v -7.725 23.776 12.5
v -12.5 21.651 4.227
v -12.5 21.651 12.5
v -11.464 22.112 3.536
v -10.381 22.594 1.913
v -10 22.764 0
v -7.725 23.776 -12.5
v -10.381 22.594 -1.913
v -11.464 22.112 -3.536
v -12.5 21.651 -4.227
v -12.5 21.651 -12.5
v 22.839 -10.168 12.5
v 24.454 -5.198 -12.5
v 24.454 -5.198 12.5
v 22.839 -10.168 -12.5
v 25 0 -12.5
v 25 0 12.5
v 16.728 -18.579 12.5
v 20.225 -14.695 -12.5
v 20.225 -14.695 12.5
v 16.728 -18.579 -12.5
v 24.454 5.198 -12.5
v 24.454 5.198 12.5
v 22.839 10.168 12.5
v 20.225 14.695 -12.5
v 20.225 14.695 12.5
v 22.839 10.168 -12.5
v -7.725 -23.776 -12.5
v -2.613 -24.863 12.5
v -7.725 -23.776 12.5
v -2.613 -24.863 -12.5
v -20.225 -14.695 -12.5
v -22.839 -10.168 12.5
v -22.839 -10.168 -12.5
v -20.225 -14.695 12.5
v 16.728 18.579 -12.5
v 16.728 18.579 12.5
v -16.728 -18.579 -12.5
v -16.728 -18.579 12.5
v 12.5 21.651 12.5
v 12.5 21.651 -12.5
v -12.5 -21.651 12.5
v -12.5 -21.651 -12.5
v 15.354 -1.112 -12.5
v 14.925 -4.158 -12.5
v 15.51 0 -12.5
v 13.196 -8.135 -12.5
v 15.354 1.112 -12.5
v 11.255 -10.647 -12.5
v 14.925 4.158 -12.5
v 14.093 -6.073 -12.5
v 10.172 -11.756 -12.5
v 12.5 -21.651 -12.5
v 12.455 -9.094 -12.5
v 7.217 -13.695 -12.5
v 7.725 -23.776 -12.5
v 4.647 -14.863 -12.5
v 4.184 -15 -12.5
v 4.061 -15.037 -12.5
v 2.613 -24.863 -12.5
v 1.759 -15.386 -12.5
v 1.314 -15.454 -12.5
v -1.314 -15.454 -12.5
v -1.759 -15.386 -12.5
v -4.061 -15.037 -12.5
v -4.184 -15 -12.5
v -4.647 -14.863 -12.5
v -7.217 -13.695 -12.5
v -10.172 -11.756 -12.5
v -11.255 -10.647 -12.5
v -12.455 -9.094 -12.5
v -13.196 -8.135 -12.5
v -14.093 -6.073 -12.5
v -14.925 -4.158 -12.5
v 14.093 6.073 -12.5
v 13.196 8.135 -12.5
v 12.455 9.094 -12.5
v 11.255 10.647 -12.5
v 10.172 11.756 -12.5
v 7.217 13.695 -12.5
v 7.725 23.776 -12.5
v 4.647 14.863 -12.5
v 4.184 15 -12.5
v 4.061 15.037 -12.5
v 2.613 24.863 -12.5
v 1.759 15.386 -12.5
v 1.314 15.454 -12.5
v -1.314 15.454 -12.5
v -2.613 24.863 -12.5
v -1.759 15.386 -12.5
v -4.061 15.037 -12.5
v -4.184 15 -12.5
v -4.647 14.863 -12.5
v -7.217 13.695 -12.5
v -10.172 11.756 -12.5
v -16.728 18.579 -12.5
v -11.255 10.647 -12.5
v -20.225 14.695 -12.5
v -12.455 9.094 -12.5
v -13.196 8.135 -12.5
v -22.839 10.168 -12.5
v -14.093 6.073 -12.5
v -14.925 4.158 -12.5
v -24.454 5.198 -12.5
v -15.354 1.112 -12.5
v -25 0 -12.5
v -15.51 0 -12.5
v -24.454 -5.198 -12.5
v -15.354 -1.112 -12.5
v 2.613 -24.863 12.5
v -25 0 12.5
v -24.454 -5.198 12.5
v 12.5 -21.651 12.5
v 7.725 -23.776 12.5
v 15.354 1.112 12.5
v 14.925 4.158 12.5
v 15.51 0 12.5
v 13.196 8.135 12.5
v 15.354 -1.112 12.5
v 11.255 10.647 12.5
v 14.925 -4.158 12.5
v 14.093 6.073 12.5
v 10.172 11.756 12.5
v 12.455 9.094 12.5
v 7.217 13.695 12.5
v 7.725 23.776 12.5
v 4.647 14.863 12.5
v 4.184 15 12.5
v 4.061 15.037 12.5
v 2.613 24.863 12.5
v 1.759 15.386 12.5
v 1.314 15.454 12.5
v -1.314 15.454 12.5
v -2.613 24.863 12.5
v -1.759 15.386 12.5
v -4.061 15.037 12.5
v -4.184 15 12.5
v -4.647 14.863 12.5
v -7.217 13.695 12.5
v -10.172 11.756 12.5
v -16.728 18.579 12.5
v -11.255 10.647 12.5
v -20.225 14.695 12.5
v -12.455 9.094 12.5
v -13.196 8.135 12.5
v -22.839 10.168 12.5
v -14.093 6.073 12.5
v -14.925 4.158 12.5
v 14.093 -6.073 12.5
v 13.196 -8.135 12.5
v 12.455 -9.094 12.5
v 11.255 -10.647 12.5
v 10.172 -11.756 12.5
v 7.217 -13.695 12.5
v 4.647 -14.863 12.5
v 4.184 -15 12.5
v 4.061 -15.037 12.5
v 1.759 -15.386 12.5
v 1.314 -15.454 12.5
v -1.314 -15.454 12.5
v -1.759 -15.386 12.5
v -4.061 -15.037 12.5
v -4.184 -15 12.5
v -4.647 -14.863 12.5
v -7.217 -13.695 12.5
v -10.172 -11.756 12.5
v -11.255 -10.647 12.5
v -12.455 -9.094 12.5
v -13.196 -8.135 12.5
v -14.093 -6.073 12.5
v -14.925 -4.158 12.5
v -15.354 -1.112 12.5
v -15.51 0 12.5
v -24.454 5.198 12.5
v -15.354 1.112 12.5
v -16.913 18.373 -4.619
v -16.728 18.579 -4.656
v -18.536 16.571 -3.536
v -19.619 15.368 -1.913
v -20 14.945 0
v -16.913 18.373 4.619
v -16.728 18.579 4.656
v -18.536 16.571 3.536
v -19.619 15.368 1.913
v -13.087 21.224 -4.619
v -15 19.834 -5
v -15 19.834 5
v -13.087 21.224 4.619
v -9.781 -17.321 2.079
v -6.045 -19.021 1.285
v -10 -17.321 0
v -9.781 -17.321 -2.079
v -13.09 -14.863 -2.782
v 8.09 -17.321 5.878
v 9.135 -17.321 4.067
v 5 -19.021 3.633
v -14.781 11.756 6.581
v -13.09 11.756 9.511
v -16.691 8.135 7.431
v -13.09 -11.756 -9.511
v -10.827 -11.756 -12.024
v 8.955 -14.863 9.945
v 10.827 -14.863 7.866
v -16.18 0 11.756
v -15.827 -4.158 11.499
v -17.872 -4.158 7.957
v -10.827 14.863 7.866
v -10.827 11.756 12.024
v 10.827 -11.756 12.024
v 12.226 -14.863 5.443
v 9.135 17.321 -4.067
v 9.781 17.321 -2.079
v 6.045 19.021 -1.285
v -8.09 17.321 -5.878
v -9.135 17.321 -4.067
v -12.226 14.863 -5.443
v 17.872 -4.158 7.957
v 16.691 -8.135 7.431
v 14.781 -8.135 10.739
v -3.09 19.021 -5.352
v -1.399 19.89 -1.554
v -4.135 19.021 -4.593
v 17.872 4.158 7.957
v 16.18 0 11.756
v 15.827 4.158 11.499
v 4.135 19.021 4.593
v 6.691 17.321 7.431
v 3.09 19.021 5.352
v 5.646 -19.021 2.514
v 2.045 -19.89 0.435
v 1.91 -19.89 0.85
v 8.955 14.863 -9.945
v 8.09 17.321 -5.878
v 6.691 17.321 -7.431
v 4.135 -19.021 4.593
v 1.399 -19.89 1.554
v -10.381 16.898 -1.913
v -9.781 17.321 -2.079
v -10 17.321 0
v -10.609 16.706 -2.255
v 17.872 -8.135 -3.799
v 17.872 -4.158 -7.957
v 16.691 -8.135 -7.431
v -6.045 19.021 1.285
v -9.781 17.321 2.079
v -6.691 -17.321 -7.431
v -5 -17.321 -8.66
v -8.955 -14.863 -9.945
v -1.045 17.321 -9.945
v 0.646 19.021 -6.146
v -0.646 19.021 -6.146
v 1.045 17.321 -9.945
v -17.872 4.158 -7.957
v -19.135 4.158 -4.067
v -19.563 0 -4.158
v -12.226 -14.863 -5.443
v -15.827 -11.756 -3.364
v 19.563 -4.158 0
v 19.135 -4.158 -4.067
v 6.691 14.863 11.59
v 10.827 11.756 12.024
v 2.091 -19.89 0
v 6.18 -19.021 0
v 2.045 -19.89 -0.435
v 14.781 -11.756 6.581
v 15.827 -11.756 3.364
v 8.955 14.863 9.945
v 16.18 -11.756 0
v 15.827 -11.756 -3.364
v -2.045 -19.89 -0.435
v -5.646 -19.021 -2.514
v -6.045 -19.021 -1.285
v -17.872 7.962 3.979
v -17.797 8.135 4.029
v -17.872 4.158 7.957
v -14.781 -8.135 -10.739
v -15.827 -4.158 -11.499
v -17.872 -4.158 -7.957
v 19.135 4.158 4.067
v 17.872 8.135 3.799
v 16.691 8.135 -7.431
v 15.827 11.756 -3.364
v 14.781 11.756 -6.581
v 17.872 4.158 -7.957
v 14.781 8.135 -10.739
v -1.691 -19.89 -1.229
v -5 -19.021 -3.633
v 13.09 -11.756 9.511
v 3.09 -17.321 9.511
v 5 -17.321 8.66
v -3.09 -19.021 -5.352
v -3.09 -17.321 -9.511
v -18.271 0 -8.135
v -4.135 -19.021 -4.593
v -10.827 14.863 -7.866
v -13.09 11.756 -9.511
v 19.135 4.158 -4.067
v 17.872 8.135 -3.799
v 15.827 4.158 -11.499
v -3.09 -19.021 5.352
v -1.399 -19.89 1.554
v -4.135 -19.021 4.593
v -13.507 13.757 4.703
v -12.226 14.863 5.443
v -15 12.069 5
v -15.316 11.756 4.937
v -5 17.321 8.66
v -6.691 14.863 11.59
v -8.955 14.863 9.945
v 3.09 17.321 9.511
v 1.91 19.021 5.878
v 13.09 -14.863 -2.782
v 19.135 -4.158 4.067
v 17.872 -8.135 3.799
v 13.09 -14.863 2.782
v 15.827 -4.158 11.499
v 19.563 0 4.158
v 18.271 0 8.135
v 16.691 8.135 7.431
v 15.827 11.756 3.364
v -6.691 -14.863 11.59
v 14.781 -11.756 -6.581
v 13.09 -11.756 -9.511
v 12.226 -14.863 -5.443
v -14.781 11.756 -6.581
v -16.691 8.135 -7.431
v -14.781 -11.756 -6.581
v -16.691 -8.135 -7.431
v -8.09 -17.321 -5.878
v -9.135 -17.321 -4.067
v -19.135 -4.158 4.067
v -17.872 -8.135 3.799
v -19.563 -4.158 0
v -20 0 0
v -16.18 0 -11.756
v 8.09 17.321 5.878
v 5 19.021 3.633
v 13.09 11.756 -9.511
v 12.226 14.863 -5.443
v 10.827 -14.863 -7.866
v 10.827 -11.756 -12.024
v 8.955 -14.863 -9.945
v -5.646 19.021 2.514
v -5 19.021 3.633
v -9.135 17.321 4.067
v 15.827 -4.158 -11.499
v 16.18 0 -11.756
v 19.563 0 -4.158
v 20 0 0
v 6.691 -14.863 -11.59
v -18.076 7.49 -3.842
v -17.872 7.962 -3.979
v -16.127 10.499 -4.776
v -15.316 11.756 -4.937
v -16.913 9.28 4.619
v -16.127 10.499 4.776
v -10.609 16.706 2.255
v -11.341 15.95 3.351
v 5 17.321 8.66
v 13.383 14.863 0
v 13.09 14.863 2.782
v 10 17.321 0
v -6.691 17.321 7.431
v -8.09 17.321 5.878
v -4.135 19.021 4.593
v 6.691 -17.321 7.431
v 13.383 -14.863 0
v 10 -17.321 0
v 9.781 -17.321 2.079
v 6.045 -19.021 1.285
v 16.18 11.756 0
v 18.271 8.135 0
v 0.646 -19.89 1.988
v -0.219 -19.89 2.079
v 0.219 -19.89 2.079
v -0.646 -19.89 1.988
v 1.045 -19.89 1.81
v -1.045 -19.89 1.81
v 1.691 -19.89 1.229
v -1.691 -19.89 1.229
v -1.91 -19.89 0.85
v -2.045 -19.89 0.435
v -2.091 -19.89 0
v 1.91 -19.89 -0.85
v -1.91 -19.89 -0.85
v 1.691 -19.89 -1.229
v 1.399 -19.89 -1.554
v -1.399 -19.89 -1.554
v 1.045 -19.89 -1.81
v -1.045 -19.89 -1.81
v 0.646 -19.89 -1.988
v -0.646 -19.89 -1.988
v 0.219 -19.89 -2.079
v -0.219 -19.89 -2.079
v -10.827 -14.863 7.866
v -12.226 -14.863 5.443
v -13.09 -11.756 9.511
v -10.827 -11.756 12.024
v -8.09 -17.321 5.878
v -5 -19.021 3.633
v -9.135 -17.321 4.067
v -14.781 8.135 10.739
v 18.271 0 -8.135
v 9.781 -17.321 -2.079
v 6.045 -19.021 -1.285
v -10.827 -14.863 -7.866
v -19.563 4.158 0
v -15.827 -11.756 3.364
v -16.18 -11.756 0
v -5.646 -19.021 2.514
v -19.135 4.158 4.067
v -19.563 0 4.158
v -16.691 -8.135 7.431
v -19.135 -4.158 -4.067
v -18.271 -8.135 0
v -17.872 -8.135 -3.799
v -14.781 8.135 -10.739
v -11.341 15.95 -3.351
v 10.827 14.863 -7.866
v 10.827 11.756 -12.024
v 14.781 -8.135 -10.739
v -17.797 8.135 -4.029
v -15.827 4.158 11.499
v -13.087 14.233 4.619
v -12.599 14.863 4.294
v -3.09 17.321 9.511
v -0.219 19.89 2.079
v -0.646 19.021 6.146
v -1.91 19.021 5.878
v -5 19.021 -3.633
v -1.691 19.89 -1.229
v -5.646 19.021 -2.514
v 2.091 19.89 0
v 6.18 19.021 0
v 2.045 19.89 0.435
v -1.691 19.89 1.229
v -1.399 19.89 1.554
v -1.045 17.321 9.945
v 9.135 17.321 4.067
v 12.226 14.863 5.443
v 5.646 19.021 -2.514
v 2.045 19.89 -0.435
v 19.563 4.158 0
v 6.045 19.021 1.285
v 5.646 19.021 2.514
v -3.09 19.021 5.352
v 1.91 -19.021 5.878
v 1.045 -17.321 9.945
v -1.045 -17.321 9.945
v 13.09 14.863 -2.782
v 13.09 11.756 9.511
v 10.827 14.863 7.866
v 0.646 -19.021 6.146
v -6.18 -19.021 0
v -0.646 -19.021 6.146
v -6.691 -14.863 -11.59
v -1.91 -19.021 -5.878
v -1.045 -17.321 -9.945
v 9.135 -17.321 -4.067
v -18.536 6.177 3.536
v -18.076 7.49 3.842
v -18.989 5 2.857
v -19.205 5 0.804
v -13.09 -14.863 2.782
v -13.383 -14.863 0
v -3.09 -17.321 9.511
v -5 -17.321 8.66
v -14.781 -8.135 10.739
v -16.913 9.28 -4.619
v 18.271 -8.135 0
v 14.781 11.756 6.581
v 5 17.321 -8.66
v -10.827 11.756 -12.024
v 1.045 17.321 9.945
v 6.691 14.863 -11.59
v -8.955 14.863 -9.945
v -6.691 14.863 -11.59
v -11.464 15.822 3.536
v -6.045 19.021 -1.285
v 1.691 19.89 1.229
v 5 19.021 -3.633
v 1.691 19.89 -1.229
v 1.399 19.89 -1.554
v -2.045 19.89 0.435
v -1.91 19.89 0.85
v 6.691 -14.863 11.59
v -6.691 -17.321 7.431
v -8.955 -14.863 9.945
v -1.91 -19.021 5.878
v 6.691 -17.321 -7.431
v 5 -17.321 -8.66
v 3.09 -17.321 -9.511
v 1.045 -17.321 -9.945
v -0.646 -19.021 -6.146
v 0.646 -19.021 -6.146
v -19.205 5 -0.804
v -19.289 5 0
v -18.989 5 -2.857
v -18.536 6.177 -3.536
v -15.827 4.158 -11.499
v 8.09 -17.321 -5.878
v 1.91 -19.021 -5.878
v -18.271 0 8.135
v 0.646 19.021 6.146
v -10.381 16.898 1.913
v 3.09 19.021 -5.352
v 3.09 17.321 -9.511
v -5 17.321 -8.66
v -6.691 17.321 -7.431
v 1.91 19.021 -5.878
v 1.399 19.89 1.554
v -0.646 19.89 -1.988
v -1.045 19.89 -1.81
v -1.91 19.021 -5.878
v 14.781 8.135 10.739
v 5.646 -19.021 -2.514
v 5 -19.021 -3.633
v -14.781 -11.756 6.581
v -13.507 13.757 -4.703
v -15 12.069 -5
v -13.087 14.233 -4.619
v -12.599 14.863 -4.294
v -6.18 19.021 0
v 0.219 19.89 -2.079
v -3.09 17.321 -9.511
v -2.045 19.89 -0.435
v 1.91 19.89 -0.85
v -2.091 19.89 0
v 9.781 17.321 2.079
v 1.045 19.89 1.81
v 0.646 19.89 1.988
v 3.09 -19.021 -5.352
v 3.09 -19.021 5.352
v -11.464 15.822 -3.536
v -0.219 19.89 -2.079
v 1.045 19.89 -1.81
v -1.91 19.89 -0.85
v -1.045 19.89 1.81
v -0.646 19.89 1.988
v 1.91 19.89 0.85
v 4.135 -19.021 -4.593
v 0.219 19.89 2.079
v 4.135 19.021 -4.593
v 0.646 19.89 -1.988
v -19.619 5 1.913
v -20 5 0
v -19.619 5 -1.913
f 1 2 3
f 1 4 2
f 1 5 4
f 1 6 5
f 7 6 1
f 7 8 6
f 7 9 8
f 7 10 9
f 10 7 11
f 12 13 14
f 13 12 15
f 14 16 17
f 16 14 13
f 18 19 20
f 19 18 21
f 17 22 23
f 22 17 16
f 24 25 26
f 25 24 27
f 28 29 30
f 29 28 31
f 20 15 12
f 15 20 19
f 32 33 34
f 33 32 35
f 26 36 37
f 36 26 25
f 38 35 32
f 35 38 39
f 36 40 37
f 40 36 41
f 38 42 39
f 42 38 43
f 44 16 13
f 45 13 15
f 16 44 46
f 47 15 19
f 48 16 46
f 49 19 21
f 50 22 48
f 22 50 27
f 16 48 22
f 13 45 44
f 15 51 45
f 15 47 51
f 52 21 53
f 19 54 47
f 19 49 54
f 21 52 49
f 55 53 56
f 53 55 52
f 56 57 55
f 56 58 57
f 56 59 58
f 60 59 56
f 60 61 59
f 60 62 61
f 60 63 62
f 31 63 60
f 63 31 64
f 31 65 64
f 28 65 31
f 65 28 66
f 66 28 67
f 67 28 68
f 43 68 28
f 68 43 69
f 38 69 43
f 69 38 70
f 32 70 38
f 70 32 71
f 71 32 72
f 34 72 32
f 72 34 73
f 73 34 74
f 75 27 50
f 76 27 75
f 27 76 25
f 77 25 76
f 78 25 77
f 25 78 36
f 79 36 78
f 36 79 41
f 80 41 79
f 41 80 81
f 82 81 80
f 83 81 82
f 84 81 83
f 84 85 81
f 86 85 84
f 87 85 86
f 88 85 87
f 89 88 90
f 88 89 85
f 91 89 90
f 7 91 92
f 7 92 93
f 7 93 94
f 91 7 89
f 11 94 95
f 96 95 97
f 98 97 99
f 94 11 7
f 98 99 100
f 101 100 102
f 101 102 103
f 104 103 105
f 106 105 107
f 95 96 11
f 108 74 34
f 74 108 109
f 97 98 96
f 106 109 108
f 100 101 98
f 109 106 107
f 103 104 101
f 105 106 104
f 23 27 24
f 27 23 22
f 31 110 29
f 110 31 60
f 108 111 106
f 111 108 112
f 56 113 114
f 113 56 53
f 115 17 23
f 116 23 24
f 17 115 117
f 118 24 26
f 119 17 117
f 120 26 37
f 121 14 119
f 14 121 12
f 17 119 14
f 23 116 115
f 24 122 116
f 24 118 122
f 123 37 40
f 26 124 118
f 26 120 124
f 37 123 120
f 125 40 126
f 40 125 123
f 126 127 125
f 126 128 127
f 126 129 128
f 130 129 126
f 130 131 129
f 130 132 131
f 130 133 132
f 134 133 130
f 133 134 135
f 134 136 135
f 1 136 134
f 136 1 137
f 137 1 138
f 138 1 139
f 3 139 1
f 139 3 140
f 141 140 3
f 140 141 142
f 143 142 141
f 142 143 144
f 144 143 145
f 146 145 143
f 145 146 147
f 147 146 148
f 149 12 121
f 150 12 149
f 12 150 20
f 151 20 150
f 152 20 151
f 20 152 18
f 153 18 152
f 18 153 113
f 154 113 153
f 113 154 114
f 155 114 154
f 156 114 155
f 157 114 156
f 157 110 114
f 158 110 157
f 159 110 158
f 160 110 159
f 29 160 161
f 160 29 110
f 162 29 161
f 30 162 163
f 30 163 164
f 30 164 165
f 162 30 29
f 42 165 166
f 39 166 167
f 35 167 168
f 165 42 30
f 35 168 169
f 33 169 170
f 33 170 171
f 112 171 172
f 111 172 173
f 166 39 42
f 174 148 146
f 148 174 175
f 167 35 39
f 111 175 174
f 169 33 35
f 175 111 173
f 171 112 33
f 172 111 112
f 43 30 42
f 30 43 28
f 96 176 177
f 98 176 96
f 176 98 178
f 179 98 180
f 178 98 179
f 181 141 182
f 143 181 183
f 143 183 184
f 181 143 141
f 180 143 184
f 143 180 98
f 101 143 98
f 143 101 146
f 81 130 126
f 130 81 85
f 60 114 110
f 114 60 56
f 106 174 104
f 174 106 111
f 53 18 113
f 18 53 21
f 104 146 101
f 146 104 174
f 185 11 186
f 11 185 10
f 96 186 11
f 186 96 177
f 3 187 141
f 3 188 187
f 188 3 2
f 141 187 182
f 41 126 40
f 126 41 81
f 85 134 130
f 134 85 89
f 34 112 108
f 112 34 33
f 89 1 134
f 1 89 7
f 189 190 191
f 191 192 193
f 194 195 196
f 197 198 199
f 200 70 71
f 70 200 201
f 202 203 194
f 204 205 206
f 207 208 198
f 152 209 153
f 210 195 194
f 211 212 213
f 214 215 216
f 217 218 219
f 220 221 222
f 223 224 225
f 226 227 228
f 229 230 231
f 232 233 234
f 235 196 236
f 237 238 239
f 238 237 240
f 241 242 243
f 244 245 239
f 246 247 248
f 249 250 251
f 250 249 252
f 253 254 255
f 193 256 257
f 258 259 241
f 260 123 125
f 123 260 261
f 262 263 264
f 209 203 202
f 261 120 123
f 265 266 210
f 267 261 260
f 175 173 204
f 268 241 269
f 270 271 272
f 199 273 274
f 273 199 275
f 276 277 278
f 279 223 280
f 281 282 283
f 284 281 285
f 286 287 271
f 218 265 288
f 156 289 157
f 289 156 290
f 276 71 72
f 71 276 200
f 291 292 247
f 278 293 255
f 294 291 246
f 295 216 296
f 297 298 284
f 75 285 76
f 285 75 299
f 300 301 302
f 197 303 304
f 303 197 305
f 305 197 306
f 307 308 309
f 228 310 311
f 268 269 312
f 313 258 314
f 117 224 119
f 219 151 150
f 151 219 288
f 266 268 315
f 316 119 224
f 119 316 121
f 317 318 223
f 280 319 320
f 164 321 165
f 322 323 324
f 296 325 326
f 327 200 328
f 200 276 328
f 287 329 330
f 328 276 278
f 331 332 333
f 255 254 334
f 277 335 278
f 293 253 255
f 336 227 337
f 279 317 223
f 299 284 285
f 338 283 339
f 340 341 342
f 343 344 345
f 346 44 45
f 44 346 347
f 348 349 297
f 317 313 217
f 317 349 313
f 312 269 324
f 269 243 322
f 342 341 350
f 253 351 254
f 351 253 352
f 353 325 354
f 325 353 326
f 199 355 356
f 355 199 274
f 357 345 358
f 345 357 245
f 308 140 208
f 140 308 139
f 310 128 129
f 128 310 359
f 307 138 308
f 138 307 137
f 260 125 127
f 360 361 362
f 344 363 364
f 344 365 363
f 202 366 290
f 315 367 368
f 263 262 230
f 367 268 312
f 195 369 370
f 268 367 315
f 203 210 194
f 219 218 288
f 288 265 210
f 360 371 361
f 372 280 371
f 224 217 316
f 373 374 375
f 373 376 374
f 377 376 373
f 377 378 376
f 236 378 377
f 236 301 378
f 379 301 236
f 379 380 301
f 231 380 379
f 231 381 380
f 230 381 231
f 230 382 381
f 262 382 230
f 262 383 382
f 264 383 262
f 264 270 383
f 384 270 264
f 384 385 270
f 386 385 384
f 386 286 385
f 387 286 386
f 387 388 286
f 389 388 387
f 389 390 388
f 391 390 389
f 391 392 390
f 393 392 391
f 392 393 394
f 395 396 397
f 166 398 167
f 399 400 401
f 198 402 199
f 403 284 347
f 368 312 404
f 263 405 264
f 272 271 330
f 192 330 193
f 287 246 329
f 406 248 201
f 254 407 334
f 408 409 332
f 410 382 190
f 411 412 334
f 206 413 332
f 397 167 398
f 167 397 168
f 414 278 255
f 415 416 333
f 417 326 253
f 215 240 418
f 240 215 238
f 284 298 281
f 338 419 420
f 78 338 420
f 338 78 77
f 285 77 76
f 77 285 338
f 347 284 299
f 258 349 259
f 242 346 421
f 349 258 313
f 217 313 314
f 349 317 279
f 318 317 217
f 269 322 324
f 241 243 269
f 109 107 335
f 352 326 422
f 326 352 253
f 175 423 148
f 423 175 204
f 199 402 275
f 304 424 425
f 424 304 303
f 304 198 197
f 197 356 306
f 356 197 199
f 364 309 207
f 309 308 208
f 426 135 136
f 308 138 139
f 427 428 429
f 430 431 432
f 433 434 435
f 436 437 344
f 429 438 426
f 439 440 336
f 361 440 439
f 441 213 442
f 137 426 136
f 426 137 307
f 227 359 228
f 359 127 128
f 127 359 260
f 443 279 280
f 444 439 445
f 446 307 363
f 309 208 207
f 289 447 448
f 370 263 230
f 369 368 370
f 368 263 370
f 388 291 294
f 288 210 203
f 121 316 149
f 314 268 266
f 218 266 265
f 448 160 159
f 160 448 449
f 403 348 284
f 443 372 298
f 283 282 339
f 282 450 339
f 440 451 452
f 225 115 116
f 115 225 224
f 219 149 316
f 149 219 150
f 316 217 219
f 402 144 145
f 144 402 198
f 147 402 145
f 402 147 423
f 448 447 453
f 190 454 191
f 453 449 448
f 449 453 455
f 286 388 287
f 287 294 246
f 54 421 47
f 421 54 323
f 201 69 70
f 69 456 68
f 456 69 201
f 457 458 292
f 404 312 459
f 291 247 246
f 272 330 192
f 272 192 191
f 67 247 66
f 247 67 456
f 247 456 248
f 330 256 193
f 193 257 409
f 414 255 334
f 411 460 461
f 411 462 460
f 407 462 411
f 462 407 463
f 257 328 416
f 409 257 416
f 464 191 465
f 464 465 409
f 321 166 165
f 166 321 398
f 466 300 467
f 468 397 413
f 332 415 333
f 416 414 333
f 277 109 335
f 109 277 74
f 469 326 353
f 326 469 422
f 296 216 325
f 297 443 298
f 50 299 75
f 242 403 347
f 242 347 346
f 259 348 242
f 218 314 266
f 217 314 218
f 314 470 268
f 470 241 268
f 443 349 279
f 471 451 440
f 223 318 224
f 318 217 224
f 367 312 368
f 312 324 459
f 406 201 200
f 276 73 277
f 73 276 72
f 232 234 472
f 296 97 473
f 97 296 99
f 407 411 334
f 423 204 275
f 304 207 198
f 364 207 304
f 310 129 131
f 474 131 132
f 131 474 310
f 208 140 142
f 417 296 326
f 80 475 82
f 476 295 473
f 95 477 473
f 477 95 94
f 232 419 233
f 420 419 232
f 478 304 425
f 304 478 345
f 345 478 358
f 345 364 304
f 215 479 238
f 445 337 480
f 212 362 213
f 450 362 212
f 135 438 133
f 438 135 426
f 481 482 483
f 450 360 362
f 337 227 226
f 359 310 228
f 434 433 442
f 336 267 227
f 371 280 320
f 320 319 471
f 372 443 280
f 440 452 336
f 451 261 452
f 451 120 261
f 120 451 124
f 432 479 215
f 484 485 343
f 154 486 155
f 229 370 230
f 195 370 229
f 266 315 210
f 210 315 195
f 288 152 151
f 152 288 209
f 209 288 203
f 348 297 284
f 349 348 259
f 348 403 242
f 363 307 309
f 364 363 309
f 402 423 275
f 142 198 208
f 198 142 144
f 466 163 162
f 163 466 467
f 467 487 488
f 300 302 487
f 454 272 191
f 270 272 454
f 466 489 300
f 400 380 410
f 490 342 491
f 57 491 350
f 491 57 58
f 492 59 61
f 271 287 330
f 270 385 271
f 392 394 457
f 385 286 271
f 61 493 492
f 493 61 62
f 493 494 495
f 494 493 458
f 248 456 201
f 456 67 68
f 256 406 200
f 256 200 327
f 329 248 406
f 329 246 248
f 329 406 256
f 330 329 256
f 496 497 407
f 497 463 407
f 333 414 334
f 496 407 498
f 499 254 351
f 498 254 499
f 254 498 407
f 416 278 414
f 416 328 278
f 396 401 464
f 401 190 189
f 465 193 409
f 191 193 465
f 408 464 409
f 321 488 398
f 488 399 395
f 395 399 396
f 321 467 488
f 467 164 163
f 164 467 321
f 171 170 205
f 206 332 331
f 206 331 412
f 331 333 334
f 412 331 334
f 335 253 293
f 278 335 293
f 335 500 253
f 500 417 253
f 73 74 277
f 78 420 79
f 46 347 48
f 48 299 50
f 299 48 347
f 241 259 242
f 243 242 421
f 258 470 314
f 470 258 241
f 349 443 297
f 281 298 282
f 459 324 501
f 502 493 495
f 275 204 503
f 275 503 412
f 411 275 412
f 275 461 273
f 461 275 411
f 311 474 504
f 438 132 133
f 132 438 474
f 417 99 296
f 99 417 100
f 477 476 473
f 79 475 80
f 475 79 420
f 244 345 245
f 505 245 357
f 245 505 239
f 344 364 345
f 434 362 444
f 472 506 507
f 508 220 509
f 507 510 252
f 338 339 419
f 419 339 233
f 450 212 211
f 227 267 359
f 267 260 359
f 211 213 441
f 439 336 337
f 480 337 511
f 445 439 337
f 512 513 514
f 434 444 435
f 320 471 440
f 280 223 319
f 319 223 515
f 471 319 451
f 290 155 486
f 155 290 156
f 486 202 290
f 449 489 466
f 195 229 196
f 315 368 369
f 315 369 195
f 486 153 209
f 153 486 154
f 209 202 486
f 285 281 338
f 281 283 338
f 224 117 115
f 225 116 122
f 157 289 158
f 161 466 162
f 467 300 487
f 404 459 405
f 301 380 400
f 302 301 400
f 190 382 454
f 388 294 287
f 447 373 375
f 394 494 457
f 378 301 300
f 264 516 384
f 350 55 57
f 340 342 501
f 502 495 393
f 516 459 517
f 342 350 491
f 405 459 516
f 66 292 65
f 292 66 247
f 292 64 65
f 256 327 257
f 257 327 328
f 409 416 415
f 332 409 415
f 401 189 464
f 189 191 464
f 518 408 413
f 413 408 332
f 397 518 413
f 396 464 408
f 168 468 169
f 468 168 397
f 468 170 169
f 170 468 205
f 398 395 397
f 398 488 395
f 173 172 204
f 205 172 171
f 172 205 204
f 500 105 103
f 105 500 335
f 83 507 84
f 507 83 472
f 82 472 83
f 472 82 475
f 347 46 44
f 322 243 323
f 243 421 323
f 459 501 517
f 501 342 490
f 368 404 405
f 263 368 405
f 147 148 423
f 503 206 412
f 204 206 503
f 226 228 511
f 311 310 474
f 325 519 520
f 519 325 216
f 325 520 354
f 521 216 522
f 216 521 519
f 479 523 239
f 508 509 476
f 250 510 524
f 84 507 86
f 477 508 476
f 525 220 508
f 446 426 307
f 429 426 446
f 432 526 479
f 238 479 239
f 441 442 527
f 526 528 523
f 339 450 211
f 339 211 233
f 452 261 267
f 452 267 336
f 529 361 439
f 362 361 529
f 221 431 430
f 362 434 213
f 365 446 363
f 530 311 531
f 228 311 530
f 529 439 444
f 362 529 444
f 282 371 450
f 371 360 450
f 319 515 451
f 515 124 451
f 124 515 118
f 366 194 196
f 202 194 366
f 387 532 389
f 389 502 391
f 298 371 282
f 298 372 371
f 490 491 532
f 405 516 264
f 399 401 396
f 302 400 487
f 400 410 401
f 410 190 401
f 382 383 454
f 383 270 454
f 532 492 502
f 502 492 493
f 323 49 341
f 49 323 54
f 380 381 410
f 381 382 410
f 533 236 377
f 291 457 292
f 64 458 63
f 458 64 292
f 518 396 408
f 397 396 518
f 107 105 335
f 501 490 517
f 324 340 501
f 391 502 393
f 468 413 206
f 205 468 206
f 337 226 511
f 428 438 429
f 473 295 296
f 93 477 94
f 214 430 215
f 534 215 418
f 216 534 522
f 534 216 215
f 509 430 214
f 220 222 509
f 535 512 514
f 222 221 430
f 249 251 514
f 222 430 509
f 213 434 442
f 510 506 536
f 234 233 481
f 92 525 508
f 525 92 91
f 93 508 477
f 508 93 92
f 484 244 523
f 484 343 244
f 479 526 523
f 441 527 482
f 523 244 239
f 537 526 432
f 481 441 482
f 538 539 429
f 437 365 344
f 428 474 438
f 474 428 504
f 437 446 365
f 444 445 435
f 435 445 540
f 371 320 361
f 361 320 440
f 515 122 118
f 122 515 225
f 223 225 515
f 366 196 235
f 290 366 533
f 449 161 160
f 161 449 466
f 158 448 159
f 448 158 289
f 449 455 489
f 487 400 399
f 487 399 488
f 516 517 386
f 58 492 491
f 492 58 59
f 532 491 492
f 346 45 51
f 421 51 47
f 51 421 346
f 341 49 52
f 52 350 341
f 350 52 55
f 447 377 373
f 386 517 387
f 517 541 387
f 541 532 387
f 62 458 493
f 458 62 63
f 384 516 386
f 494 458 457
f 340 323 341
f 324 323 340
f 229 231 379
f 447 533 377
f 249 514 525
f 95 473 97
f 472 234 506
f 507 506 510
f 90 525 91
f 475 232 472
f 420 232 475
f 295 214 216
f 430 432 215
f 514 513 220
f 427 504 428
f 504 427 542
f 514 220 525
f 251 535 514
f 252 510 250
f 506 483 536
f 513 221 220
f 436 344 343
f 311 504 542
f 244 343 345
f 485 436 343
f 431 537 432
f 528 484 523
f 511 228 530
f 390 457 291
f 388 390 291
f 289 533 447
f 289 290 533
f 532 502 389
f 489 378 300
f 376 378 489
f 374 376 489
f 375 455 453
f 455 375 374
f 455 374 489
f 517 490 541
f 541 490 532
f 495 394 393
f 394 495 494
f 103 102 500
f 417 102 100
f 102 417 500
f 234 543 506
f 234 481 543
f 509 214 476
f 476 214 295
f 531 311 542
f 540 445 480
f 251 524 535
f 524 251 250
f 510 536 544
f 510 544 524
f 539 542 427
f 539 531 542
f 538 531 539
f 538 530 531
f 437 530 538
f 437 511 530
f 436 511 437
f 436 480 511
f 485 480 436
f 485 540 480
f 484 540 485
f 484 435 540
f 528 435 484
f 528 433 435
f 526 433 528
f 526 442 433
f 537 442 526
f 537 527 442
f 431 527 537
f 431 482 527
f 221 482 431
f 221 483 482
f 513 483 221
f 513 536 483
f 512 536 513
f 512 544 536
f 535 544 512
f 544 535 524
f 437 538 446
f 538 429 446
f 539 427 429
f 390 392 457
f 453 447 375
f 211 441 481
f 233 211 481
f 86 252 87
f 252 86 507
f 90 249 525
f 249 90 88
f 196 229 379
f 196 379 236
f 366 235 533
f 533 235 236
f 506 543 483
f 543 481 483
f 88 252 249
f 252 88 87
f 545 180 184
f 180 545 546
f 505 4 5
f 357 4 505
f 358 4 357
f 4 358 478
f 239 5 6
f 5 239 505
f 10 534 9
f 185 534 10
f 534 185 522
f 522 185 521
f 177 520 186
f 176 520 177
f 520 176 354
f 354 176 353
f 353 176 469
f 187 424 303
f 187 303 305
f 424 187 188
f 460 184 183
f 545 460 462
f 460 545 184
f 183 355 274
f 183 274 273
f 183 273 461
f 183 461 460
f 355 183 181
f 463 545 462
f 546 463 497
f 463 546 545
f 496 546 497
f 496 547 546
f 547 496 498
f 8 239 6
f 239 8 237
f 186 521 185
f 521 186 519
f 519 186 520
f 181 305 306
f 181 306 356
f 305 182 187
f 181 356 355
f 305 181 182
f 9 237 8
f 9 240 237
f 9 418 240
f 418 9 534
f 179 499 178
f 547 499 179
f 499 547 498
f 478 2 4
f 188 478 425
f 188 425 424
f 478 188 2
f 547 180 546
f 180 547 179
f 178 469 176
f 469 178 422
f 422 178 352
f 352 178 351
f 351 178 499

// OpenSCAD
shaft_width_hole = 5;
shaft_height_hole = 40;

shaft_width = 4.7;
shaft_height = 80;
module shaft(height,width){
	cylinder(height,width,width,center = true);
}

//shaft();

holder_hole_width = 20;
holder_thickness = holder_hole_width + 5;
module holder(){
	difference(){
		rotate([90,0,0])
		cylinder(holder_thickness,holder_thickness,holder_thickness,center = true);
		sphere(holder_hole_width);
	}
}

module holder_piece(){
	difference(){
		holder();
		translate([-holder_hole_width + shaft_width_hole,0,-holder_thickness])
		shaft(shaft_height_hole,shaft_width_hole);
	}
}


module shaft_stub(){
	difference(){
		cylinder(10,20,20);
		shaft(shaft_height_hole,shaft_width_hole);
	}
}


rotate([90,0,0])
holder_piece();
//
//shaft(shaft_height,shaft_width);

//shaft_stub();
